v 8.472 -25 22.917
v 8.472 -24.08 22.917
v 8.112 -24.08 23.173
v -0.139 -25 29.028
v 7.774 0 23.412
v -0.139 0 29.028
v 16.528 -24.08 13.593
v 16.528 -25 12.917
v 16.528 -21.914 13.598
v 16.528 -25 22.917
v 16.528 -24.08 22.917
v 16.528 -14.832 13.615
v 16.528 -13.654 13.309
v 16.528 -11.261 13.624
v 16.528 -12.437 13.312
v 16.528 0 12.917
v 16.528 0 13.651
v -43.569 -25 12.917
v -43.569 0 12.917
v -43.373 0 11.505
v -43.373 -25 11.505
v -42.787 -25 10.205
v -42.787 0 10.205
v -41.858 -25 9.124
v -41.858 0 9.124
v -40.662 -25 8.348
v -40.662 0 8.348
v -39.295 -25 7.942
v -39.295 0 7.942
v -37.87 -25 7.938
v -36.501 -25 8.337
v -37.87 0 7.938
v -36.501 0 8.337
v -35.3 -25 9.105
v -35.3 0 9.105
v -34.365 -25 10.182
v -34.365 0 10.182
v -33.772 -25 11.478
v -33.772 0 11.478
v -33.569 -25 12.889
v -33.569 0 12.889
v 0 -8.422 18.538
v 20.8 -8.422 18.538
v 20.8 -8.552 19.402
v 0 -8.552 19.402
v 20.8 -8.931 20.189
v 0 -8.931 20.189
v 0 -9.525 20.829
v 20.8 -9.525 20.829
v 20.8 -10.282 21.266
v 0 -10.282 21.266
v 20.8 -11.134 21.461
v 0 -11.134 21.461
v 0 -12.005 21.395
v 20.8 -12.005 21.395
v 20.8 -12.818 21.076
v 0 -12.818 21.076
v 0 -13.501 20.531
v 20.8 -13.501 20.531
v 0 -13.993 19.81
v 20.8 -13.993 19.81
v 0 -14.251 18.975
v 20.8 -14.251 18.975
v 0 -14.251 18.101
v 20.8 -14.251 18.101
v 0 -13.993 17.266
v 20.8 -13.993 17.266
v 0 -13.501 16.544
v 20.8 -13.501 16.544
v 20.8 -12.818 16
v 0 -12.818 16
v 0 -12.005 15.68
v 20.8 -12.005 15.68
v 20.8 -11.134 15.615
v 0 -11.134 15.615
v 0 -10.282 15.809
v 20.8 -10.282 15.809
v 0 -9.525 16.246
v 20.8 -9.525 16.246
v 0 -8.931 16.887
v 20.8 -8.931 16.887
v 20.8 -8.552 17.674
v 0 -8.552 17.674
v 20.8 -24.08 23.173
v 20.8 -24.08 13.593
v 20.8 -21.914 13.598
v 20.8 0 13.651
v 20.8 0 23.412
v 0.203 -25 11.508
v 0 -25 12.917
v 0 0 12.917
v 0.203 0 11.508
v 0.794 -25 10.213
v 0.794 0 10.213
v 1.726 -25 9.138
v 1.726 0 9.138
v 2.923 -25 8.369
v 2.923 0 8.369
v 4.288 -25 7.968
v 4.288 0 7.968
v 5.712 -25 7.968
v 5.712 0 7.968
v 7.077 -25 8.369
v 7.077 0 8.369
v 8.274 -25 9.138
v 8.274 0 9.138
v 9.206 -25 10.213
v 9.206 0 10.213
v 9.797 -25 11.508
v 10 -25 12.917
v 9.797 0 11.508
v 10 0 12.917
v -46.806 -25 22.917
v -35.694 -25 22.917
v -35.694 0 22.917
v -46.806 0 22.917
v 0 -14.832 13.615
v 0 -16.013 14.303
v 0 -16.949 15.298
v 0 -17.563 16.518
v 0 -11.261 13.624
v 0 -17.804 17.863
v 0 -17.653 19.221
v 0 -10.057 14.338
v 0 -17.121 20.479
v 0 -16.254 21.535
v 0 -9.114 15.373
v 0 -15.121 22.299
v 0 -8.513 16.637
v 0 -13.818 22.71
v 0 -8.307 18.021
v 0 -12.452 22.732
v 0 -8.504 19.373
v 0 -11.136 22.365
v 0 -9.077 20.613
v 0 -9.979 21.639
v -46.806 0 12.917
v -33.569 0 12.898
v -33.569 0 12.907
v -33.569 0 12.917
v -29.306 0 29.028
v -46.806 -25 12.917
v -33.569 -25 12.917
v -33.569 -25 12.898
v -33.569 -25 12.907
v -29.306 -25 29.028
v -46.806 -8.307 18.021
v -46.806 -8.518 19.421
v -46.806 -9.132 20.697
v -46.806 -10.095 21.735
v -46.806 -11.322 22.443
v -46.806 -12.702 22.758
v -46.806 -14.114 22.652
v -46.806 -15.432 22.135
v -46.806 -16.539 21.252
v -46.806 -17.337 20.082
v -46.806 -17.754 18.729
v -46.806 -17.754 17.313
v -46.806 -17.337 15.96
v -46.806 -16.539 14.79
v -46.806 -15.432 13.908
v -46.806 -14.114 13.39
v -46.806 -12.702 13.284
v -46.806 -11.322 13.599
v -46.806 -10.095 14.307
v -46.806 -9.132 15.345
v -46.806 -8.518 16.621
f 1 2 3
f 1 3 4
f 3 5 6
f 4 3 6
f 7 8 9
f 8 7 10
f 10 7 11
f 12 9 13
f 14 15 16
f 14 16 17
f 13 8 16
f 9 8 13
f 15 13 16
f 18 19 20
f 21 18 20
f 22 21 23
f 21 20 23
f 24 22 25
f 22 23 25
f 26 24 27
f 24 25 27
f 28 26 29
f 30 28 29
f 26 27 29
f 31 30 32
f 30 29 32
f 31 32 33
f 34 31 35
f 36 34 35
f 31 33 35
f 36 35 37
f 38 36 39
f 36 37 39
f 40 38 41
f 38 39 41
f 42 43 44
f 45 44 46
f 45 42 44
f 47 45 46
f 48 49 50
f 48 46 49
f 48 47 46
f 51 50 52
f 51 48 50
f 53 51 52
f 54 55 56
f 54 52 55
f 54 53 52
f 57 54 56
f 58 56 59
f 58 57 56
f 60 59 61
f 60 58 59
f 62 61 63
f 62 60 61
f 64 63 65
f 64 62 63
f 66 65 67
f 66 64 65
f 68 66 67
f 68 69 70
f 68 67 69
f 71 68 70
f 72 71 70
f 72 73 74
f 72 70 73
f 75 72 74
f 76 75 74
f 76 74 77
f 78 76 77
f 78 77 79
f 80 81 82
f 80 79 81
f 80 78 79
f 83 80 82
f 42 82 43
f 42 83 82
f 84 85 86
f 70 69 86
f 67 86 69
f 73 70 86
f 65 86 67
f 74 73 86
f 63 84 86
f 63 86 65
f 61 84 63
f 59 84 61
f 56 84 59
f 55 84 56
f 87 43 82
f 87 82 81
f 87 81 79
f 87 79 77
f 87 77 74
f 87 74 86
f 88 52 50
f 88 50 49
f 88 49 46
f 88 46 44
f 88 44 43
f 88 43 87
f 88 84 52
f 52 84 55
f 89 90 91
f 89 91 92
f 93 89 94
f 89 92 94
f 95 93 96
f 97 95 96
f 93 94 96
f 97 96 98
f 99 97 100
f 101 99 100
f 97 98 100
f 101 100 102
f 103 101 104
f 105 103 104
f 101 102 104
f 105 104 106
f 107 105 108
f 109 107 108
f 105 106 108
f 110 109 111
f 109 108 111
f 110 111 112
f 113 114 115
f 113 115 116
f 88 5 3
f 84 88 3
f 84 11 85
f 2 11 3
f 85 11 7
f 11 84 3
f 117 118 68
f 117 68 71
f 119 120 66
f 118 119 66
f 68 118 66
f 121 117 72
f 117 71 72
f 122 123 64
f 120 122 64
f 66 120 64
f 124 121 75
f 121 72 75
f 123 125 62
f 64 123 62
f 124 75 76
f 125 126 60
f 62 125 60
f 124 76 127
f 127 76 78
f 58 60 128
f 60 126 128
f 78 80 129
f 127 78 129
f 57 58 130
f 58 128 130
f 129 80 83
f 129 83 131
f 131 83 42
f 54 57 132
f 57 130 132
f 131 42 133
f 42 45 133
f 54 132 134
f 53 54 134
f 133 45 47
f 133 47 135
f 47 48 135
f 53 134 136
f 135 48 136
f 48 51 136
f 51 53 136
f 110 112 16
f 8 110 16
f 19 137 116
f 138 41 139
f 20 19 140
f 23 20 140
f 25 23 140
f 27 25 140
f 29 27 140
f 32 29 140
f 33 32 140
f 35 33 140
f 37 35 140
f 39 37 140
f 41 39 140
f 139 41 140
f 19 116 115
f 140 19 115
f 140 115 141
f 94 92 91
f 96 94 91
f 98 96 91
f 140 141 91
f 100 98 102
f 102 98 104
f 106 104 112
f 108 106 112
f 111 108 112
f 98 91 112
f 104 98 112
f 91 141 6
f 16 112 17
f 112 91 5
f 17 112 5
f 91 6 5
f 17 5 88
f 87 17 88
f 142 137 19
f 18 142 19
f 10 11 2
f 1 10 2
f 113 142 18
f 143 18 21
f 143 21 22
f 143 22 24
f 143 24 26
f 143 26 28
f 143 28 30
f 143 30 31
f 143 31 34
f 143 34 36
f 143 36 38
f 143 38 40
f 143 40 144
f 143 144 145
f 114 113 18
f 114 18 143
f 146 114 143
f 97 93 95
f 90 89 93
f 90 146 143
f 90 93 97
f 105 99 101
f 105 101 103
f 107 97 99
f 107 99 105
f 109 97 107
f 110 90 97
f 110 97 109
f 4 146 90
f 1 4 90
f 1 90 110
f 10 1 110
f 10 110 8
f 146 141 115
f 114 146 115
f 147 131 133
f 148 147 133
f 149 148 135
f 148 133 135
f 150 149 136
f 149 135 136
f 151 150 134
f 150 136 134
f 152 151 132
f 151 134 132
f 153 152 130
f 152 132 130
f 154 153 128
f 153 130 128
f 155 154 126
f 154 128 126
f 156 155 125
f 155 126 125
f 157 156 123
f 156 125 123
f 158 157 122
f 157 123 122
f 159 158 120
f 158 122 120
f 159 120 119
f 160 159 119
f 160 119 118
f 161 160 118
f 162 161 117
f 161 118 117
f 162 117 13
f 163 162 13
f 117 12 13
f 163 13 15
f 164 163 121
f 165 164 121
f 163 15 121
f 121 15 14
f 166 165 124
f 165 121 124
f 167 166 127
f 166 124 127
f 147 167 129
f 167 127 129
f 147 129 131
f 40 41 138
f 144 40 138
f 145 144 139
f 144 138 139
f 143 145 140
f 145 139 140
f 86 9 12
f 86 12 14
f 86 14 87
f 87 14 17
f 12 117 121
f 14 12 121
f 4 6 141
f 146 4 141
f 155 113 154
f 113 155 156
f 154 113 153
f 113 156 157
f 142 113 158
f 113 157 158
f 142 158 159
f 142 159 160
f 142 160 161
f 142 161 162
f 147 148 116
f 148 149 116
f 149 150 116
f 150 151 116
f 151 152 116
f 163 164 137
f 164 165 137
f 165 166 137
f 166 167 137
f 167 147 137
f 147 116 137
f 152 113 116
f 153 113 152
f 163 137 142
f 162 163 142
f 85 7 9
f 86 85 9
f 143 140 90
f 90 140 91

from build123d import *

# Parameters (mm, degrees)
F1_DEPTH = 25
F2_R     = 4.75
F3_DEPTH = 51.2
F5_DEPTH = 20.8
F6_R     = 2.931006
F7_DEPTH = 45.7


with BuildPart() as f1:
    # F0 (on Front) → F1 (new body)
    with BuildSketch(Plane.XZ):
        with BuildLine():
            Line((-46.805558, 22.916667), (-46.805558, 12.916667))
            Line((-46.805558, 12.916667), (-43.568752, 12.916667))
            ThreePointArc((-43.568752, 12.916667), (-38.568828, 17.889121), (-33.568904, 12.916667))
            Line((-33.568904, 12.916667), (-29.305557, 12.916667))
            Line((-29.305557, 12.916667), (0, 12.916667))
            ThreePointArc((0, 12.916667), (5, 17.916667), (10, 12.916667))
            Line((10, 12.916667), (16.527779, 12.916667))
            Line((16.527779, 12.916667), (16.527779, 22.916667))
            Line((16.527779, 22.916667), (8.472223, 22.916667))
            Line((8.472223, 22.916667), (-0.13889, 29.02778))
            Line((-0.13889, 29.02778), (-29.305557, 29.02778))
            Line((-29.305557, 29.02778), (-35.694448, 22.916667))
            Line((-35.694448, 22.916667), (-46.805558, 22.916667))
        make_face()
        with BuildLine():
            ThreePointArc((-33.568904, 12.916667), (-38.568828, 17.889121), (-43.568752, 12.916667))
            ThreePointArc((-43.568752, 12.916667), (-38.582602, 7.88914), (-33.568828, 12.889121))
            ThreePointArc((-33.568828, 12.889121), (-33.568847, 12.902894), (-33.568904, 12.916667))
        make_face()
        with BuildLine():
            ThreePointArc((10, 12.916667), (5, 17.916667), (0, 12.916667))
            ThreePointArc((0, 12.916667), (5, 7.916667), (10, 12.916667))
        make_face()
    extrude(amount=F1_DEPTH)

    # F2 (on Right) → F3 (cut, symmetric)
    with BuildSketch(Plane.YZ):
        with Locations((-13.057046, 18.02115)):
            Circle(F2_R)
    extrude(amount=F3_DEPTH, both=True, mode=Mode.SUBTRACT)

    # F4 (on Right) → F5 (join)
    with BuildSketch(Plane.YZ):
        Polygon((0, 23.411883), (-24.079781, 23.172596), (-24.079781, 13.592975), (-21.914035, 13.598205), (0, 13.65112), align=None)
    extrude(amount=F5_DEPTH)

    # F6 (on Right) → F7 (cut)
    with BuildSketch(Plane.YZ):
        with Locations((-11.352646, 18.537864)):
            Circle(F6_R)
    extrude(amount=F7_DEPTH, mode=Mode.SUBTRACT)


solid = f1.part
